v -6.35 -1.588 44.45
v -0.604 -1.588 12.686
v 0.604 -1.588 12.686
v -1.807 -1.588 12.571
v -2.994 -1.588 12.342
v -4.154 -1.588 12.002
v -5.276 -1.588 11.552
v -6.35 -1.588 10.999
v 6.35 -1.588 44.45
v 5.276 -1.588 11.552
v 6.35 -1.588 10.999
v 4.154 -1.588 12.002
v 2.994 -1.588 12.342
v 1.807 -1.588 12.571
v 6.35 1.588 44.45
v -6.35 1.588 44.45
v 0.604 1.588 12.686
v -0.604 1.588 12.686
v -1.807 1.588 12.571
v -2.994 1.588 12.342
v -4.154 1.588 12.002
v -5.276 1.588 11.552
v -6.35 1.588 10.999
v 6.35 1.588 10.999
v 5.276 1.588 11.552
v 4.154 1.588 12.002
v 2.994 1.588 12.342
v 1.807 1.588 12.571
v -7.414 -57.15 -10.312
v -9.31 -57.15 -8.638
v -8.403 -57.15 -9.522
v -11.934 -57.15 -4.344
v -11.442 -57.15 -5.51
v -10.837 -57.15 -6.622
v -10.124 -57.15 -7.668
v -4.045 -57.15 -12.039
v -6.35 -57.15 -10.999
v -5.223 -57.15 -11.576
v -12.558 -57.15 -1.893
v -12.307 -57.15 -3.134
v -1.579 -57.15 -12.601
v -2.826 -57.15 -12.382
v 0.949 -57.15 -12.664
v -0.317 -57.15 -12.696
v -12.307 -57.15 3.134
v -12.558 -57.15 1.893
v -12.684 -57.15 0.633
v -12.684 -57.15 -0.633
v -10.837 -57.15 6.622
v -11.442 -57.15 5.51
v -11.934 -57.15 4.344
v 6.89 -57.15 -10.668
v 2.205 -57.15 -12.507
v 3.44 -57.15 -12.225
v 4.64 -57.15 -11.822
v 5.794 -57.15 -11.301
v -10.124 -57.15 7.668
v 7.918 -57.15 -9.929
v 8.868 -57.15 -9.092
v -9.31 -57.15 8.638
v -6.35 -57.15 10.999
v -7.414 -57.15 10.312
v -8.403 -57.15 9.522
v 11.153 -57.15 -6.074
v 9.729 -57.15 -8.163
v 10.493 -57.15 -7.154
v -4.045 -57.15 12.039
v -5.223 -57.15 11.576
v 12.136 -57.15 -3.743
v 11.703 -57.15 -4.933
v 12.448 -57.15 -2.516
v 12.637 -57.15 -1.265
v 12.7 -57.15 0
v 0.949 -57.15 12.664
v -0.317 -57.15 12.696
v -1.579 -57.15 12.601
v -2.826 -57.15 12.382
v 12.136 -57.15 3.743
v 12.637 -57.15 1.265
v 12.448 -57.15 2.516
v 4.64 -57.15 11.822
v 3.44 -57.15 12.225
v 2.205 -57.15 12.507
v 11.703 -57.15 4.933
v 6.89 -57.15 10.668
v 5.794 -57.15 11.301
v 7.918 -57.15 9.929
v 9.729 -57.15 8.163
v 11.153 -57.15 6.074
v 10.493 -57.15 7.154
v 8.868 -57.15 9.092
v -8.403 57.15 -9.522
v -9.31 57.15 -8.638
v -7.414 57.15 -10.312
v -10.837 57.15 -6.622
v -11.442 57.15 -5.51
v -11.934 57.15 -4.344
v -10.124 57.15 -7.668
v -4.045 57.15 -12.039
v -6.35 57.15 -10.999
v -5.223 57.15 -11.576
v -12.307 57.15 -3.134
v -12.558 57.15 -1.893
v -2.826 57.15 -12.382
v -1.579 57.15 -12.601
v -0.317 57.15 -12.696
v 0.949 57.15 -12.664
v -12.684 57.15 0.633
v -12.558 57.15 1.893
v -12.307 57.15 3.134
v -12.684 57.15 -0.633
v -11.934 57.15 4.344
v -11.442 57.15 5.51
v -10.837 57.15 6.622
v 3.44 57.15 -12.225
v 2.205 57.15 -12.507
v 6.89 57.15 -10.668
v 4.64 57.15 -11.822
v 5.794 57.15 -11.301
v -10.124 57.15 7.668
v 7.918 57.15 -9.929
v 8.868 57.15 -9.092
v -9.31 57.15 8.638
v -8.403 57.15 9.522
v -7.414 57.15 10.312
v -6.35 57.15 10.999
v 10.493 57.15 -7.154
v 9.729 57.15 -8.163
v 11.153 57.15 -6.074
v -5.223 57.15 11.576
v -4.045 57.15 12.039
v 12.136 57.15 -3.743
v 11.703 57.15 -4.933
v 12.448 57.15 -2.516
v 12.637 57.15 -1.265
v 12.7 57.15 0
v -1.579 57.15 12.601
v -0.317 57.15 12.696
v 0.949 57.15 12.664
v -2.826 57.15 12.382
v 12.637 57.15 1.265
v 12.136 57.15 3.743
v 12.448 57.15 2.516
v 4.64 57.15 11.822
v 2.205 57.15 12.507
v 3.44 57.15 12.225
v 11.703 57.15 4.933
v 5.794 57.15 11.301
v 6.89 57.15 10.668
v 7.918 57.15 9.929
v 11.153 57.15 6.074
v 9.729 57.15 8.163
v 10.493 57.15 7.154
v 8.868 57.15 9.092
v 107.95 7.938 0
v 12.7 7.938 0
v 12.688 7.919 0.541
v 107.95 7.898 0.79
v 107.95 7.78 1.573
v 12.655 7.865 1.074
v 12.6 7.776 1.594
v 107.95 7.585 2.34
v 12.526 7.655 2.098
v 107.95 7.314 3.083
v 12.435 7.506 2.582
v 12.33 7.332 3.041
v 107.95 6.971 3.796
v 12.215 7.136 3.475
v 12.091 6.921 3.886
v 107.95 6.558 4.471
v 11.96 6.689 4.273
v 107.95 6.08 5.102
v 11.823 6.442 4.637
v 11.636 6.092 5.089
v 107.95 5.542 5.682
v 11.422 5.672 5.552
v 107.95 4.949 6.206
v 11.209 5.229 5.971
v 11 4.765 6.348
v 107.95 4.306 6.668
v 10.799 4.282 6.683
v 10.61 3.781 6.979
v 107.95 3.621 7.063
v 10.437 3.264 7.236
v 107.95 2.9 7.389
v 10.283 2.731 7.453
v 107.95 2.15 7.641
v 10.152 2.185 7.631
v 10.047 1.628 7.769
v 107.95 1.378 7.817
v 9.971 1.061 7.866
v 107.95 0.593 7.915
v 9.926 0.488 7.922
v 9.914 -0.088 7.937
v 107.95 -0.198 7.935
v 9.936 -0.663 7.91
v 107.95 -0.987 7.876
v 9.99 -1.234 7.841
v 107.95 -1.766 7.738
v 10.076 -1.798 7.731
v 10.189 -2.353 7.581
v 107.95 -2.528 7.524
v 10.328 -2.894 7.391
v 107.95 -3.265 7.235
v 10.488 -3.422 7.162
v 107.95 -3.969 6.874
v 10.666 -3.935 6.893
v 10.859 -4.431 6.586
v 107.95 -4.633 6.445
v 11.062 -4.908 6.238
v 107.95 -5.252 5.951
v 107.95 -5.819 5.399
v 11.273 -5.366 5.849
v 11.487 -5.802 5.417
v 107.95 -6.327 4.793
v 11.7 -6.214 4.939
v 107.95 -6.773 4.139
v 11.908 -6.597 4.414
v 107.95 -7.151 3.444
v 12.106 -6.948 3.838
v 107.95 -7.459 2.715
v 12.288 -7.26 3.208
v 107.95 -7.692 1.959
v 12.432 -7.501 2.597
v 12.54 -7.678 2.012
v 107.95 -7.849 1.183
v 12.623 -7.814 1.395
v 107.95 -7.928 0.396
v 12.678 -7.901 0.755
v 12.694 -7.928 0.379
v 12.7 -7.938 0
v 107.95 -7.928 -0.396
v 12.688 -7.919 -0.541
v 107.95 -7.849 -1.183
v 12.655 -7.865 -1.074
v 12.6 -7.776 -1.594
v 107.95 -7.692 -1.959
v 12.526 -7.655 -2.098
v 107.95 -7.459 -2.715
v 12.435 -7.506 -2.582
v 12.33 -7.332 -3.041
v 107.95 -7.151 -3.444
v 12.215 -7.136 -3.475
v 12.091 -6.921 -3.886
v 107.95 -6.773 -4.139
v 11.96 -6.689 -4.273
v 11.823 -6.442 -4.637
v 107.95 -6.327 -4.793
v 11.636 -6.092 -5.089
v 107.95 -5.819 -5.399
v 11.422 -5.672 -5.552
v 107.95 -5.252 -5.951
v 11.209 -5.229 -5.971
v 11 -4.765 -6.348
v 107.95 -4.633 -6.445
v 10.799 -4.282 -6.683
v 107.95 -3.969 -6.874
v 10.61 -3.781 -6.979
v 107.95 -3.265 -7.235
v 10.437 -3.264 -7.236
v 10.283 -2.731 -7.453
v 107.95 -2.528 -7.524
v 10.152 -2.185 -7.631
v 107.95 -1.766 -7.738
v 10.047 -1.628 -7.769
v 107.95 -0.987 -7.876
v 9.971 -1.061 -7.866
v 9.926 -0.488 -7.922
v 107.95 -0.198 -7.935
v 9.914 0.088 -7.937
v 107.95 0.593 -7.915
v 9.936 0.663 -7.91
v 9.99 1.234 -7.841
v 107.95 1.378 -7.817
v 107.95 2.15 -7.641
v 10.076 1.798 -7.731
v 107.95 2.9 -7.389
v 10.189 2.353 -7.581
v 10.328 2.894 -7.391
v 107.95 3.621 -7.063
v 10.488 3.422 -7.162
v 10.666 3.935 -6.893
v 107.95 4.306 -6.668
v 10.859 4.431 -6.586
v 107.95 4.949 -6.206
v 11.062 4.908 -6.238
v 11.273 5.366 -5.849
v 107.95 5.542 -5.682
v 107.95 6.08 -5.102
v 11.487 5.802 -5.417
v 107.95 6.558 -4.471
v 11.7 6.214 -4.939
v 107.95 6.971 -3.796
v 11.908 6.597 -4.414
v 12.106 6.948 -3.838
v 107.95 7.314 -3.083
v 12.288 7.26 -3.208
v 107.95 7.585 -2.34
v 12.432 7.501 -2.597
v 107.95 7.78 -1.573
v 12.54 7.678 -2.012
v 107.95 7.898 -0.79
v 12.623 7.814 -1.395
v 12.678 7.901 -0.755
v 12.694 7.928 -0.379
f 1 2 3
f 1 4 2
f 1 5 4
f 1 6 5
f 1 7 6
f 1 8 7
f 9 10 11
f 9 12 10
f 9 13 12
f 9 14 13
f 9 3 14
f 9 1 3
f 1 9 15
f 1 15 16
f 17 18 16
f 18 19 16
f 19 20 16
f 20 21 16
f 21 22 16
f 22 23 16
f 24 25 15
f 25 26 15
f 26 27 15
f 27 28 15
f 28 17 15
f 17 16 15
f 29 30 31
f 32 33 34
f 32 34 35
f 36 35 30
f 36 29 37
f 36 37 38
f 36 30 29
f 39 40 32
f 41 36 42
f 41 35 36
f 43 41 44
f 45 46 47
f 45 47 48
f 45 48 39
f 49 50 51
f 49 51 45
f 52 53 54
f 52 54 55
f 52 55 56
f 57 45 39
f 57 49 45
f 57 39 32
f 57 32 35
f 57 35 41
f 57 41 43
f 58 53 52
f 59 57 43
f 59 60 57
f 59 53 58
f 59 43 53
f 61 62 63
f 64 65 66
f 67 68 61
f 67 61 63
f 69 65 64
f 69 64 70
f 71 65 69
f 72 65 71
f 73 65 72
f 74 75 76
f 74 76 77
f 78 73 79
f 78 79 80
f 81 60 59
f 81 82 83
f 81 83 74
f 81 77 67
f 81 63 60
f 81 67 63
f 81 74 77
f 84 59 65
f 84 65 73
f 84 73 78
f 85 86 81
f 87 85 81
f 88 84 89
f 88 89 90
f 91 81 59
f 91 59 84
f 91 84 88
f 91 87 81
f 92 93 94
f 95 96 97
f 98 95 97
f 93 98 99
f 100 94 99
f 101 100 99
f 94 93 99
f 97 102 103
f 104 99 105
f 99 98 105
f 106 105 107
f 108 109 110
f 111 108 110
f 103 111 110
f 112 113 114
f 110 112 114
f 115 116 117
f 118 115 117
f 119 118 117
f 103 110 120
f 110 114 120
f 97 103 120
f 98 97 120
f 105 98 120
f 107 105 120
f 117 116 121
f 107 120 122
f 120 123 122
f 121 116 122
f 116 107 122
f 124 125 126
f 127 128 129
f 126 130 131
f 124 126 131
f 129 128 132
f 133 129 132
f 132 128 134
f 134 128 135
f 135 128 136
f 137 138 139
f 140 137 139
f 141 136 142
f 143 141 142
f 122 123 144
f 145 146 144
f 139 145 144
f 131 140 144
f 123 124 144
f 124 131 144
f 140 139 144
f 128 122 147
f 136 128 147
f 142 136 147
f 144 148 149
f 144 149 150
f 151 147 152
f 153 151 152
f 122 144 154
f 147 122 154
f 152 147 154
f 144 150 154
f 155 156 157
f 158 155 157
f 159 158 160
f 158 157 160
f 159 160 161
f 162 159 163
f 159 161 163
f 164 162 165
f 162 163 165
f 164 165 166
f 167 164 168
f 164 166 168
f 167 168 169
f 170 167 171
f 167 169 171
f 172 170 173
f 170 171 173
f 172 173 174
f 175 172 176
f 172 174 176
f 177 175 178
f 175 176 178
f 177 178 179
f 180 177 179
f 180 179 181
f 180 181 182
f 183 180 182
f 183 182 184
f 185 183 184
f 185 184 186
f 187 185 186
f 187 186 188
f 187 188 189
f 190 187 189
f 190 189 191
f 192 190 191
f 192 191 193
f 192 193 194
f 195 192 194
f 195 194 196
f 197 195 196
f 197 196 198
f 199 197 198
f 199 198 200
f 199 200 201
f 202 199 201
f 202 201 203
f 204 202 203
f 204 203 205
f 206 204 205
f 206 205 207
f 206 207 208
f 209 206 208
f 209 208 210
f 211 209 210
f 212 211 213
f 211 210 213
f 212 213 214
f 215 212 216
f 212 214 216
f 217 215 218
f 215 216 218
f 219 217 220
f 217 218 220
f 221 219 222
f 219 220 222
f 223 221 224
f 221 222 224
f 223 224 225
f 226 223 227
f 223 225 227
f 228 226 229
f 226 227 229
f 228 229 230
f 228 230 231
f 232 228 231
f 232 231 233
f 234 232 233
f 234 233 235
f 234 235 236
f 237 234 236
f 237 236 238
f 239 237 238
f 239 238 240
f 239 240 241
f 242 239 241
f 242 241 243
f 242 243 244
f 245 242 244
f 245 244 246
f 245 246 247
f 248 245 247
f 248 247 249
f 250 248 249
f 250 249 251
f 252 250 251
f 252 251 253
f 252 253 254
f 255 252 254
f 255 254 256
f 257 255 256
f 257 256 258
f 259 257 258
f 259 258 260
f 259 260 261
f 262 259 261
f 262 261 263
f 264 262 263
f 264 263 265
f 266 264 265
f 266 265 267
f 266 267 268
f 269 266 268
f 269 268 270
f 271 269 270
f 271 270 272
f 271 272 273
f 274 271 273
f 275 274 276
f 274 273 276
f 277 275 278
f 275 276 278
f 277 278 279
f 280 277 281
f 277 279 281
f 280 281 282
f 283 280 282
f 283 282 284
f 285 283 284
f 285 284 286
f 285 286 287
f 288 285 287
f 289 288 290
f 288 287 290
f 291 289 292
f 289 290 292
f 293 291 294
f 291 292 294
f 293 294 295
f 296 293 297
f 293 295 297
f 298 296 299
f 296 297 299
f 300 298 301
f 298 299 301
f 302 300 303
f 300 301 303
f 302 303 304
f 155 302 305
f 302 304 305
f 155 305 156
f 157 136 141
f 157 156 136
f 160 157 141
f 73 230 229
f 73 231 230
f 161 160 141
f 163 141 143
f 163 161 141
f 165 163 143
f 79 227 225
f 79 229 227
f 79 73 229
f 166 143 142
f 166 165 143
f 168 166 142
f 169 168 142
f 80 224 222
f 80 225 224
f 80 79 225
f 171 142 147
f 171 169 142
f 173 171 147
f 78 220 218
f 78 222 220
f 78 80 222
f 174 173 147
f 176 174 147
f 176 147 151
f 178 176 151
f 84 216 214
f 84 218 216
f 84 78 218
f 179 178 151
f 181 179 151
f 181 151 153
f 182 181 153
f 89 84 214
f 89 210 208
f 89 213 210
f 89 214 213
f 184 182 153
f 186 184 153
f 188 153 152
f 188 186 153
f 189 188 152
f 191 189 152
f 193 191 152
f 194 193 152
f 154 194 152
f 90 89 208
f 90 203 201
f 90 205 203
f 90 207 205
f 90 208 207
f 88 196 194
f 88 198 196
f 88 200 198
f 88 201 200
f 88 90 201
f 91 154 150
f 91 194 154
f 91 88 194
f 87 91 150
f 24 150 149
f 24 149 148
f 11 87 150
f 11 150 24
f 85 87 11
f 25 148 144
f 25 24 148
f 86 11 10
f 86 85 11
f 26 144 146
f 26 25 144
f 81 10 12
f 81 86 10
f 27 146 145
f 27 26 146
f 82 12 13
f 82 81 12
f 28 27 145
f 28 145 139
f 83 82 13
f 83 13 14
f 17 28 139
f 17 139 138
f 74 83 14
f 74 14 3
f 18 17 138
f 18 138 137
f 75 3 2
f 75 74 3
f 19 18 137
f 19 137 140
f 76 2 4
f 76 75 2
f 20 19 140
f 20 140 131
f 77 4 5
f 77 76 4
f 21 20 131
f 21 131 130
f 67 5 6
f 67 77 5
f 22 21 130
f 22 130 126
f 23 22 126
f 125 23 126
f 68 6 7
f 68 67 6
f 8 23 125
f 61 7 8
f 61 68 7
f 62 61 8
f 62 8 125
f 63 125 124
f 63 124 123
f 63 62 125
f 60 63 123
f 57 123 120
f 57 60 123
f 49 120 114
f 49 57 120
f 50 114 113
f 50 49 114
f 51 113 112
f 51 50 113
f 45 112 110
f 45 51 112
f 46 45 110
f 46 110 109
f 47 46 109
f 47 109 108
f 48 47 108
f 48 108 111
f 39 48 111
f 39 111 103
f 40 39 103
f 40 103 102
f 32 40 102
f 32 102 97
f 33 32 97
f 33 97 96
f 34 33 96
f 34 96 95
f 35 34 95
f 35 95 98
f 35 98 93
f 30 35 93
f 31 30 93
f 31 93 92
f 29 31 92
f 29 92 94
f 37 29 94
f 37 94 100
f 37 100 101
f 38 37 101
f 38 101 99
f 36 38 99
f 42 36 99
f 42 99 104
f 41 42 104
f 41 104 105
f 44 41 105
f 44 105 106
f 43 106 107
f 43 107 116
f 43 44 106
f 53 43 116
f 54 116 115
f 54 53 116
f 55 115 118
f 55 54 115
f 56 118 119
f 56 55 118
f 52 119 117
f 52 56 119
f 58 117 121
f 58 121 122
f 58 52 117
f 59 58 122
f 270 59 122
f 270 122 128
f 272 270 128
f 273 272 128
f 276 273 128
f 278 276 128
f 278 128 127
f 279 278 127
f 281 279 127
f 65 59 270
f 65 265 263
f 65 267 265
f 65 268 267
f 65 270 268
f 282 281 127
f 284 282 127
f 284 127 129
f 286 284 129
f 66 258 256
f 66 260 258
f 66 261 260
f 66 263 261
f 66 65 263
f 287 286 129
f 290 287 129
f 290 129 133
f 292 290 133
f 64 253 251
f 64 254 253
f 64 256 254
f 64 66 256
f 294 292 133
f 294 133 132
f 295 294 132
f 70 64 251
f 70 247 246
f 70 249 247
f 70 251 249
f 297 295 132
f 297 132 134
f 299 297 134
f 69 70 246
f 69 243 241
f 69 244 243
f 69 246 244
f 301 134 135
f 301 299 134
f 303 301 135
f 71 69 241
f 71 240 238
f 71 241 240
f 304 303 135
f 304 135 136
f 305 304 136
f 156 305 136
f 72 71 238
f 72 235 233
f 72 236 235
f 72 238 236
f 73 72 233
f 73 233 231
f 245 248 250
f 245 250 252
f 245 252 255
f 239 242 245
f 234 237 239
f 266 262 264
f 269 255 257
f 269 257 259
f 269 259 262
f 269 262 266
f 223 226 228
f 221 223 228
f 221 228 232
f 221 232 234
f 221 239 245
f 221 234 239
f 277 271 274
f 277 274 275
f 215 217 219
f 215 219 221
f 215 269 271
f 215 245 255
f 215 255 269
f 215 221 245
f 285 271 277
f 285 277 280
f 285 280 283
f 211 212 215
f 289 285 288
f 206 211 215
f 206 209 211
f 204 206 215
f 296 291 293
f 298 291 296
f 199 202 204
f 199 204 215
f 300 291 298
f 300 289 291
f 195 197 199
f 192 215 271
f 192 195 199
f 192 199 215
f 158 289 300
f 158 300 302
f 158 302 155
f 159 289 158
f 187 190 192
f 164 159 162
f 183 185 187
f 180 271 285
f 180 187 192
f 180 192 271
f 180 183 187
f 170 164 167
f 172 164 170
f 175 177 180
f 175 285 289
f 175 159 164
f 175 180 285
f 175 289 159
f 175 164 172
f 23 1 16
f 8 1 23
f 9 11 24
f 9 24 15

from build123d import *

# Parameters (mm, degrees)
F1_R     = 7.9375
F2_DEPTH = 107.95
F0_R     = 12.7
F3_DEPTH = 57.15
F5_DEPTH = 1.5875


with BuildPart() as f2:
    # F1 (on Right) → F2 (new body)
    with BuildSketch(Plane.YZ):
        Circle(F1_R)
    extrude(amount=F2_DEPTH)

    # F0 (on Front) → F3 (join, symmetric)
    with BuildSketch(Plane.XZ):
        Circle(F0_R)
    extrude(amount=F3_DEPTH, both=True)

    # F4 (on Front) → F5 (join, symmetric)
    with BuildSketch(Plane.XZ):
        Polygon((-6.35, 6.35), (0, 6.35), (6.35, 6.35), (6.35, 44.45), (-6.35, 44.45), align=None)
    extrude(amount=F5_DEPTH, both=True)


solid = f2.part
